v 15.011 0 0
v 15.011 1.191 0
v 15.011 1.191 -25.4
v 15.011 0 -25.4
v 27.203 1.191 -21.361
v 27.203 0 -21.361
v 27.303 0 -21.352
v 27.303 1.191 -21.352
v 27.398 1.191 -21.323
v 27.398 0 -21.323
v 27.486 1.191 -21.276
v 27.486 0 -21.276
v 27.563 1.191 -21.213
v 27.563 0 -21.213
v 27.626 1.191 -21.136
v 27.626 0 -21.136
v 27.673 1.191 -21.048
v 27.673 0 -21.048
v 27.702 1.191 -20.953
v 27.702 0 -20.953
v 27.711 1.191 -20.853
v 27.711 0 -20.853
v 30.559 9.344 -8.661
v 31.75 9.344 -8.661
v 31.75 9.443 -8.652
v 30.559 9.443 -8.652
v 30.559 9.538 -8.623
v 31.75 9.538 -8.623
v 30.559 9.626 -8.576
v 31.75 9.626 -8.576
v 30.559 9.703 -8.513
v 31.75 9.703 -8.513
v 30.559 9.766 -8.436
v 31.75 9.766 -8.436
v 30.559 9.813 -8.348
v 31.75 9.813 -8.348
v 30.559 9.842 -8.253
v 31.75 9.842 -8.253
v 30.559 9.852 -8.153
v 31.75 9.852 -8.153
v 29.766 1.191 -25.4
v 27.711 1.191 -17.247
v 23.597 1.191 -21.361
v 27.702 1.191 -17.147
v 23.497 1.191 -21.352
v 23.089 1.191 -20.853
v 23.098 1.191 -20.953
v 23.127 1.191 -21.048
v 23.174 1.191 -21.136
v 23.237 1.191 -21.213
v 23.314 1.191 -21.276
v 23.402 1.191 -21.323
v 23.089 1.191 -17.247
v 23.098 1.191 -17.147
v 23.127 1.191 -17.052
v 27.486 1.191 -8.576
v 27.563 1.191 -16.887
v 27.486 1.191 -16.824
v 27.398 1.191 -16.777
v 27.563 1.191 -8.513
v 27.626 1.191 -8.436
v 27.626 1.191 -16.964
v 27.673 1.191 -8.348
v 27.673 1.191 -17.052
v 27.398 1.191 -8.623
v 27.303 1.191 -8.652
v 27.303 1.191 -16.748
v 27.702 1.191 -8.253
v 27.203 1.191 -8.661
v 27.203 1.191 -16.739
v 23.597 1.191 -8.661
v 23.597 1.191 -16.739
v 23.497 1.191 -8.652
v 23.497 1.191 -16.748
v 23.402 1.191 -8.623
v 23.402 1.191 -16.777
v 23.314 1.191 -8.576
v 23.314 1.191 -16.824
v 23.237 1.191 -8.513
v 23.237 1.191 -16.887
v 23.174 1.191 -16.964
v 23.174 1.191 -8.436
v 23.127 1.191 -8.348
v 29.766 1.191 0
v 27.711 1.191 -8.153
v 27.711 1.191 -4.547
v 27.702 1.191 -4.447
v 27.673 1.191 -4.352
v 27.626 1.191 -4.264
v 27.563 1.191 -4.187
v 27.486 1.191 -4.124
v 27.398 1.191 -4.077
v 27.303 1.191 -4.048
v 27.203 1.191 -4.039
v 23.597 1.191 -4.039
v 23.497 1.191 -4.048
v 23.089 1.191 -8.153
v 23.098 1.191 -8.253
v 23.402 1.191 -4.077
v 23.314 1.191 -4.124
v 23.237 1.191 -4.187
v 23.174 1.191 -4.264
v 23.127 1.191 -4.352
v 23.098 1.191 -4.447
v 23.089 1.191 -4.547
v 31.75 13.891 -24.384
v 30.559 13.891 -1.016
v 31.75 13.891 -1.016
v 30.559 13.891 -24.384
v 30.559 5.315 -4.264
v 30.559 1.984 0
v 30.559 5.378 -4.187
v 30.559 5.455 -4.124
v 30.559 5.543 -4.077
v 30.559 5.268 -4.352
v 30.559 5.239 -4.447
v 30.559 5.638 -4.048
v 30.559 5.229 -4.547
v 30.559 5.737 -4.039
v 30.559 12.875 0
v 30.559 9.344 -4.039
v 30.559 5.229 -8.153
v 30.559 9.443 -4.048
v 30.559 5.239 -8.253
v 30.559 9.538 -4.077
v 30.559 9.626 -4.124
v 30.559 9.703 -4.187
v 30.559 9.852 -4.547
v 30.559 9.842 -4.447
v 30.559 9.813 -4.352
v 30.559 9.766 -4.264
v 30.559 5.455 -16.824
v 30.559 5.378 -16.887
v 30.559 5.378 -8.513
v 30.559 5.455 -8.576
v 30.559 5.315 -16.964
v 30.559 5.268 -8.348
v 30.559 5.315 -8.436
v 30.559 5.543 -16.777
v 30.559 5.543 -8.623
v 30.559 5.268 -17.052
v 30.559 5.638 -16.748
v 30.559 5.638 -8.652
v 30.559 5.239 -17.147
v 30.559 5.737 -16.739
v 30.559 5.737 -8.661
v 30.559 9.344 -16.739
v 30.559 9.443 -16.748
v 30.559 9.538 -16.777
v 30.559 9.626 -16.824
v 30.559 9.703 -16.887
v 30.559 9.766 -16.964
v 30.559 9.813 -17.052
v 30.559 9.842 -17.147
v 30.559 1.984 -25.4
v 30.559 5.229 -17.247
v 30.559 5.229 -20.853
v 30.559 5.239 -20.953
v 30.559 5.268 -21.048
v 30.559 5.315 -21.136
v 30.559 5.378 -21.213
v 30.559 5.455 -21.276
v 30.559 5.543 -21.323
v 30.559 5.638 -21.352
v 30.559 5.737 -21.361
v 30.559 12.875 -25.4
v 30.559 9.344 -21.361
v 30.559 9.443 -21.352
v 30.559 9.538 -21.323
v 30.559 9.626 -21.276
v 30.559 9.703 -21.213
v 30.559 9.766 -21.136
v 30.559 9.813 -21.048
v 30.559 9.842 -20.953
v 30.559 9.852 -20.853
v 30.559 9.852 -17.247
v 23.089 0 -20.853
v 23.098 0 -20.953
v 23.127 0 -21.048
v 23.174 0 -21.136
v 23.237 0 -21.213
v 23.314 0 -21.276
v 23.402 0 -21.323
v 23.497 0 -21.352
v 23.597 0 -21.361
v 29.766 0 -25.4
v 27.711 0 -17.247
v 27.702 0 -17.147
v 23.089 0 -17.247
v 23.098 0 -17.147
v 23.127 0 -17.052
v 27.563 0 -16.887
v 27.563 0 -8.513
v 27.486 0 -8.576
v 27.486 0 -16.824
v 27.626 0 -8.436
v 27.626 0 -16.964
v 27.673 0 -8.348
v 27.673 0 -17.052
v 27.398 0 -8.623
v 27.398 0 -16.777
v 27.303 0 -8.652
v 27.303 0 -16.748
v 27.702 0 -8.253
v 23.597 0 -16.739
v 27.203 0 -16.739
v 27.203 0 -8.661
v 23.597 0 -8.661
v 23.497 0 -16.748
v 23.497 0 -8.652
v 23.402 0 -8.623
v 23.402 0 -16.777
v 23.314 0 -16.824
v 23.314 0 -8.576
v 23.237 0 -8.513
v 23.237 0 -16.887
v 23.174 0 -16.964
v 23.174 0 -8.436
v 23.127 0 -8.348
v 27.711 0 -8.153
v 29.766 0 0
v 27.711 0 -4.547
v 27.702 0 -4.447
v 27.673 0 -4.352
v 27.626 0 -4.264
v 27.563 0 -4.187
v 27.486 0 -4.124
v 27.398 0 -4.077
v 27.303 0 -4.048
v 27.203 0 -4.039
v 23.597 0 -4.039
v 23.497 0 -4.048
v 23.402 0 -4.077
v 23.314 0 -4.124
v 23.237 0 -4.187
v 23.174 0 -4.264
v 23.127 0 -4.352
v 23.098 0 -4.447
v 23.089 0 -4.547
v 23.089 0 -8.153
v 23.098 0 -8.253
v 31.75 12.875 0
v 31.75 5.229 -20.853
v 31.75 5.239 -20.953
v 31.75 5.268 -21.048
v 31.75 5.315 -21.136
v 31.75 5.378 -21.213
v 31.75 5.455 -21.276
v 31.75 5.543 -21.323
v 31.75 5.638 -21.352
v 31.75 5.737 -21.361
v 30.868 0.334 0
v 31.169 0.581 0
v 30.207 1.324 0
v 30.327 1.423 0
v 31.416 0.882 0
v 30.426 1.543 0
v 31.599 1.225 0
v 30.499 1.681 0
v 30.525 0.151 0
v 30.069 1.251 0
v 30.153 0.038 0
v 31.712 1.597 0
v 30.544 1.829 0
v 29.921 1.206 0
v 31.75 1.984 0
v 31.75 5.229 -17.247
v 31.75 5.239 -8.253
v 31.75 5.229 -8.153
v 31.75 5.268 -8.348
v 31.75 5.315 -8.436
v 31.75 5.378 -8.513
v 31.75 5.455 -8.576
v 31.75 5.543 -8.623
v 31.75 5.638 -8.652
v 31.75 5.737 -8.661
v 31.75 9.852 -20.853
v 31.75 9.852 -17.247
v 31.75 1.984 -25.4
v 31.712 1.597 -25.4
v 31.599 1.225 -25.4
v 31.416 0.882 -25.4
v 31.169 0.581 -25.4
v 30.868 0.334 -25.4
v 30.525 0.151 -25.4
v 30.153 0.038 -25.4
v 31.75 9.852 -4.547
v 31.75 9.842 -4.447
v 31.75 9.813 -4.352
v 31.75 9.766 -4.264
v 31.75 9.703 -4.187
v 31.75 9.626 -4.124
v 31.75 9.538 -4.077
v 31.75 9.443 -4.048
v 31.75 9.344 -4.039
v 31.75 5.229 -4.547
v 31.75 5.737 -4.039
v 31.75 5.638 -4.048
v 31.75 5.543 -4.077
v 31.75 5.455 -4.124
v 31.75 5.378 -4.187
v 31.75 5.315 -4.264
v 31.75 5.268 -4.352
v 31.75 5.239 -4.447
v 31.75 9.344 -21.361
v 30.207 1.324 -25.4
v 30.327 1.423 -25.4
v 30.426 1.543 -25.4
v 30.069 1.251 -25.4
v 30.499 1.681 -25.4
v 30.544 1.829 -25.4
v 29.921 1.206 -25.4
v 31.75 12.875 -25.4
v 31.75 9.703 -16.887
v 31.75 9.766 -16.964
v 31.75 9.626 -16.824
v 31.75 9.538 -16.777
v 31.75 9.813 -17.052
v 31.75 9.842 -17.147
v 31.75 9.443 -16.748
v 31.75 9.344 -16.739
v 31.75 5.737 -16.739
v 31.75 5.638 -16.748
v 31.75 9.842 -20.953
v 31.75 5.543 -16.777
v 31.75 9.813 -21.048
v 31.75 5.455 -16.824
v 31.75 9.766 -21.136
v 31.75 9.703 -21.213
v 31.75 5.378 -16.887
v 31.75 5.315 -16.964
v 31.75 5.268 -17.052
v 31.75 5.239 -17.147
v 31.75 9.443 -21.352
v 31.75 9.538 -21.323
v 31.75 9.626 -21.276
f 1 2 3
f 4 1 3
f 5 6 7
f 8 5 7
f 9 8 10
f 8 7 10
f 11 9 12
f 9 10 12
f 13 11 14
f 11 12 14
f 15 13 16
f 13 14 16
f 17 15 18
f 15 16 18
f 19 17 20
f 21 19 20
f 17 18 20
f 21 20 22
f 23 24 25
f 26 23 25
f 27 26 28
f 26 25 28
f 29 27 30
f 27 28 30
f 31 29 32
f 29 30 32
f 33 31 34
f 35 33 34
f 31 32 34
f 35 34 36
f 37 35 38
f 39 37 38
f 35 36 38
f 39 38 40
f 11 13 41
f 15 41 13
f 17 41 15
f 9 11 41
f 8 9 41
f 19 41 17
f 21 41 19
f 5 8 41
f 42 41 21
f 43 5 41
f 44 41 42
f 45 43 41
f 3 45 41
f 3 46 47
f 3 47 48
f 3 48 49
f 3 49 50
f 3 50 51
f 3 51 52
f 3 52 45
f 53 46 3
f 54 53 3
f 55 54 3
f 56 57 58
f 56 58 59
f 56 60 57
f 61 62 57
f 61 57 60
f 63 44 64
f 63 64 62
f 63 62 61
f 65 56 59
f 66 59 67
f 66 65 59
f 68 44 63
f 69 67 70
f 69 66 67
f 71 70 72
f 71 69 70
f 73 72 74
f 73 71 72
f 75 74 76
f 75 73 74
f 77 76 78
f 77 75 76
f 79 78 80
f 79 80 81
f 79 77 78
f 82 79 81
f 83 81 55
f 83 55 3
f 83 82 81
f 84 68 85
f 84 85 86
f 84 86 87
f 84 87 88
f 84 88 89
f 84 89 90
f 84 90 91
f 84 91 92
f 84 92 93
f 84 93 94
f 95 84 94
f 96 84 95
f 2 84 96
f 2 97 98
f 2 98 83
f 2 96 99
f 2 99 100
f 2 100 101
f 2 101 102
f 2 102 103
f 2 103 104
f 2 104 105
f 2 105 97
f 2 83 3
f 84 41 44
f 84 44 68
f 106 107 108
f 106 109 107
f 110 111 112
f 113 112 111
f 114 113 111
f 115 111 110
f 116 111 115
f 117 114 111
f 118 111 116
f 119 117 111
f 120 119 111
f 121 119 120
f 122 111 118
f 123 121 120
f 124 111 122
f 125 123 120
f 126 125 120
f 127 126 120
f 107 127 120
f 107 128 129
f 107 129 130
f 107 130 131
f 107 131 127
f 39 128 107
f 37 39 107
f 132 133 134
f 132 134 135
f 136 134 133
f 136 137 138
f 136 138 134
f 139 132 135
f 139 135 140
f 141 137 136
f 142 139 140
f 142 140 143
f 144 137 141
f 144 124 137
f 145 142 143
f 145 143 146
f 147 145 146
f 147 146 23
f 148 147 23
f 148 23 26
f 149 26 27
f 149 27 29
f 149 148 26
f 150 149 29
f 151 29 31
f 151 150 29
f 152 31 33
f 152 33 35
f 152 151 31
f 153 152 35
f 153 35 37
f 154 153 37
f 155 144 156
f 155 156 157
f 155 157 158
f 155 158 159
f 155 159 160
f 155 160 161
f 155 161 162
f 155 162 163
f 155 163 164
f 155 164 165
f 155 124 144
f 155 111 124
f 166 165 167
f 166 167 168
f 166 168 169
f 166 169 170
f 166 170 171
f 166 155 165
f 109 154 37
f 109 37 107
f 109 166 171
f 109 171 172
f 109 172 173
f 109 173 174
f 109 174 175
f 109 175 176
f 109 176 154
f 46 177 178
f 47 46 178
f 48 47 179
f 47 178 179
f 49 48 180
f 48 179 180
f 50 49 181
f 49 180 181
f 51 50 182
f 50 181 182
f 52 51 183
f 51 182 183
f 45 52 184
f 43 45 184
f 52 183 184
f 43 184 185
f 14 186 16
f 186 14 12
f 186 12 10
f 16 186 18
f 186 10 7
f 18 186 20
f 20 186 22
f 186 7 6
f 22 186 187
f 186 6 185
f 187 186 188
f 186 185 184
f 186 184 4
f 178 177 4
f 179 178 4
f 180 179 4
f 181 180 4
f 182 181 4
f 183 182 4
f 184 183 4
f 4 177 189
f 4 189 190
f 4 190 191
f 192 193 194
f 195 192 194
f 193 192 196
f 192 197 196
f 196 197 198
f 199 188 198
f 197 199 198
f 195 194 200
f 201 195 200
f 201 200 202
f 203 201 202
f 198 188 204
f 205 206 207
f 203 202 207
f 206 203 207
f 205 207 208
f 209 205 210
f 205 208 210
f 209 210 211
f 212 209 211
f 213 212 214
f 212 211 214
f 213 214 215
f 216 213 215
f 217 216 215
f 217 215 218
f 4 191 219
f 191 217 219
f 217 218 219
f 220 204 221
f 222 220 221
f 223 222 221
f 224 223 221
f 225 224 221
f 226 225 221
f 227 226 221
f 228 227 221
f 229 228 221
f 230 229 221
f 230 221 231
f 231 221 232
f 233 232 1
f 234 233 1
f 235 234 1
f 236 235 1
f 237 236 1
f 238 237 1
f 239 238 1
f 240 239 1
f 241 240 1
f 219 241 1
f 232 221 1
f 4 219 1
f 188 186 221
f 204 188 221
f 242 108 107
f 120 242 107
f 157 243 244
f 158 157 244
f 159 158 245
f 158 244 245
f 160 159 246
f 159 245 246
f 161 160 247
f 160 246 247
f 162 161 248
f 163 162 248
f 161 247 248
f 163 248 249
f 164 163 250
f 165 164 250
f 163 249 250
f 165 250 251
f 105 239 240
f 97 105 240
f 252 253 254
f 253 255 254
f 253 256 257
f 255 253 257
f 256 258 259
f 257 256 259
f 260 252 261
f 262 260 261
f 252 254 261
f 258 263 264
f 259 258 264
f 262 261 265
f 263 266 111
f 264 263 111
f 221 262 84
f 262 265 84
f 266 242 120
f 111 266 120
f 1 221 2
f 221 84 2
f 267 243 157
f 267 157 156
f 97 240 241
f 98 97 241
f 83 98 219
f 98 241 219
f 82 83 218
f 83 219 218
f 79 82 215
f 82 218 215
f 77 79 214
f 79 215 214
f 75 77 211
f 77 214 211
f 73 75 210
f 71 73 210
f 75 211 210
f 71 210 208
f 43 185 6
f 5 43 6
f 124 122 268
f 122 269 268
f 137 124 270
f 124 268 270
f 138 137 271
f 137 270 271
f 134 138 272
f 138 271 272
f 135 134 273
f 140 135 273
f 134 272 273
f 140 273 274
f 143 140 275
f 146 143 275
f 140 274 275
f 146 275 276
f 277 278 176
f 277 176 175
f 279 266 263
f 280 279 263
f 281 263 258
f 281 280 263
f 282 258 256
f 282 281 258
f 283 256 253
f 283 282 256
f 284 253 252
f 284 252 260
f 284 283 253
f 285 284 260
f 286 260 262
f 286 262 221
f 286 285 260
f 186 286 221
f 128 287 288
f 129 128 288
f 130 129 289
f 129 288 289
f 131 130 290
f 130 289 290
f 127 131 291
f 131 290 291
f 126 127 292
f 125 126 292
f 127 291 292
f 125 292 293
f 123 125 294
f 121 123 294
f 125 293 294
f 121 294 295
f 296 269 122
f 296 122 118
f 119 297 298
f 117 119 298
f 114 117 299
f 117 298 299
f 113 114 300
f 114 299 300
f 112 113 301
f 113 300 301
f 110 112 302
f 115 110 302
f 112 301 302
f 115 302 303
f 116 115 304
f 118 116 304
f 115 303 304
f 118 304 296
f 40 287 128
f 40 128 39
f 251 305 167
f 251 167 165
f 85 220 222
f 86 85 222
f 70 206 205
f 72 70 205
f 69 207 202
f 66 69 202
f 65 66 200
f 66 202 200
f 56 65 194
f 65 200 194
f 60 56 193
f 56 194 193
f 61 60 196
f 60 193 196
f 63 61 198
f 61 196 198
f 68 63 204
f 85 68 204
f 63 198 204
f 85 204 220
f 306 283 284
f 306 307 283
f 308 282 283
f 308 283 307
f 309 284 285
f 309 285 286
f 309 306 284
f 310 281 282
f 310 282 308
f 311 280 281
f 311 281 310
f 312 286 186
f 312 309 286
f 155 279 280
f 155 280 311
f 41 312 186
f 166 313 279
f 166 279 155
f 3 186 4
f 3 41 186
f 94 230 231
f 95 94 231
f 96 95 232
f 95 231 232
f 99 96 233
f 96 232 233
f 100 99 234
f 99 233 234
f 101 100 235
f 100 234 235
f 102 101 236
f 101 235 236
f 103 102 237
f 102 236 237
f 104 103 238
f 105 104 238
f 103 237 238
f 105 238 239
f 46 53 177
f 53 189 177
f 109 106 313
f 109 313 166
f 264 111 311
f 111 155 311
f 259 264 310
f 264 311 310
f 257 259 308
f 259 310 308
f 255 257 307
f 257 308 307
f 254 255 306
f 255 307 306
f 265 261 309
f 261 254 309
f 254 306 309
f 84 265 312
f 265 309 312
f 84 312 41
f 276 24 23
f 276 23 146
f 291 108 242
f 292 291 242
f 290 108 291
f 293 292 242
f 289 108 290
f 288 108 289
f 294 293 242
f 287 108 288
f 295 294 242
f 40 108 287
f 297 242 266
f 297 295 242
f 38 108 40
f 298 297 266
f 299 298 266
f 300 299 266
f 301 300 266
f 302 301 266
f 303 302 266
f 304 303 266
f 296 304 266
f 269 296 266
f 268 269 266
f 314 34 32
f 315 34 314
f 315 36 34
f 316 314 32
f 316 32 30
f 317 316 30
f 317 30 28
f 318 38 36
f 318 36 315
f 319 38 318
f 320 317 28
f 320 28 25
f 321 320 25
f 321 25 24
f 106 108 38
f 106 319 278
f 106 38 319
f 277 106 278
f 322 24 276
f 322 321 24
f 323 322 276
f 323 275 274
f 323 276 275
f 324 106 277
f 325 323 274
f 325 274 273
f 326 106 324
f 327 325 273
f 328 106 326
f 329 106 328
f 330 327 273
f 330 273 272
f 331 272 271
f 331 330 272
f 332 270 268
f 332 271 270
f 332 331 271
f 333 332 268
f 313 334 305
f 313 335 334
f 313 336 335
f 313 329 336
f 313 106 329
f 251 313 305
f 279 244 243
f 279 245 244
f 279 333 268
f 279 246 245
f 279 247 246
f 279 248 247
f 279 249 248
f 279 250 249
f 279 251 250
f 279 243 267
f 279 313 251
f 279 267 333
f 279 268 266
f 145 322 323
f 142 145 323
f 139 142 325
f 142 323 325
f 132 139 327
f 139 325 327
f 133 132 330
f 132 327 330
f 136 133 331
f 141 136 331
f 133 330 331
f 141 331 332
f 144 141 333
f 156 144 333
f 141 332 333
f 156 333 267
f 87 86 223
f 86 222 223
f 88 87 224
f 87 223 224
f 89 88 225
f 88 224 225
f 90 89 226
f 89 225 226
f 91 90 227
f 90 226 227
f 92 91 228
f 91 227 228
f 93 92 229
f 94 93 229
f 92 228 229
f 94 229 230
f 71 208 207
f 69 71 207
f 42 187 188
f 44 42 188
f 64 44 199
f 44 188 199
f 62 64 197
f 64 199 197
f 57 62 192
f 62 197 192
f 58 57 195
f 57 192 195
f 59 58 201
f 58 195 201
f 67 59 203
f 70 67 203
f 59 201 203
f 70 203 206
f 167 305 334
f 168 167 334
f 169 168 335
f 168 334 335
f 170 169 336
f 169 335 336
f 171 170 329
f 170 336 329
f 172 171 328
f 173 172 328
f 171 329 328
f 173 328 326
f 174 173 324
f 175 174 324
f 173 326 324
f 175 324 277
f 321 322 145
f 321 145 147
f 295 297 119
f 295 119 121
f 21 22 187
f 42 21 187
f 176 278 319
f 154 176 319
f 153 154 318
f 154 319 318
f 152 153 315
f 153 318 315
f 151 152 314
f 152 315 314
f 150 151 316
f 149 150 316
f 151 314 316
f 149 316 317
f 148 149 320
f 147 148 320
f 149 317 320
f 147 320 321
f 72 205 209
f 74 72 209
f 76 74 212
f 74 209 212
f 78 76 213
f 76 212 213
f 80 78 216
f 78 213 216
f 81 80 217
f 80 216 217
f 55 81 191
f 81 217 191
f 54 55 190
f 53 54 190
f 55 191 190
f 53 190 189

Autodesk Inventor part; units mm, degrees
ref_plane "YZ Plane" through (0, 0, 0) normal (1, 0, 0) x (0, 1, 0)
ref_plane "XZ Plane" through (0, 0, 0) normal (0, 1, 0) x (-1, 0, 0)
sketch "Sketch1" plane through (0, 0, 0) normal (0, 1, 0) x (-1, 0, 0)
  line L0 (-31.75, 0) -> (31.75, 0)
  line L1 (31.75, 0) -> (31.75, -25.4)
  line L2 (31.75, -25.4) -> (-31.75, -25.4)
  line L3 (-31.75, -25.4) -> (-31.75, 0)
  line L4 (31.75, 0) -> (-31.75, -25.4) construction
  point P0 (0, 0)
  point P1 (0, 0)
  dimension "d0" = 63.5
  dimension "d1" = 25.4
extrude "Plate1" add sketch "Sketch1" along normal blind 1.1906
sketch "Sketch2" plane through (30.5594, 0, -25.4) normal (1, 0, 0) x (0, 1, 0)
  line L0 (0, 25.4) -> (0, 0)
  line L1 (0, 0) -> (13.8906, 0)
  line L2 (13.8906, 0) -> (13.8906, 25.4)
  line L3 (13.8906, 25.4) -> (0, 25.4)
edge flange "Flanges" height 12.7 angle 90 thickness 1.1906 bend radius 0.7937 thickness toward (1, 0, 0) relief tear relief width 1.1906 relief depth 0.5953 corner gap 1.1906 corner form 0 edges at (31.75, 1.1906, -12.7) (-31.75, 1.1906, -12.7) wall of the first edge with corners at (30.5594, 0, 0) (30.5594, 0, -25.4) (30.5594, 13.8906, -25.4) (30.5594, 13.8906, 0)
bend "Bend1"
corner "Corner1"
sketch "Sketch3" plane through (31.75, 1.9844, -25.4) normal (1, 0, 0) x (0, 0, -1)
  line L0 (-20.8534, 7.8676) -> (-17.2466, 7.8676)
  line L1 (-16.7386, 7.3596) -> (-16.7386, 3.7528)
  line L2 (-17.2466, 3.2448) -> (-20.8534, 3.2448)
  line L3 (-21.3614, 3.7528) -> (-21.3614, 7.3596)
  arc A0 (-20.8534, 7.8676) -> (-21.3614, 7.3596) centre (-20.8534, 7.3596) ccw
  arc A1 (-16.7386, 7.3596) -> (-17.2466, 7.8676) centre (-17.2466, 7.3596) ccw
  arc A2 (-17.2466, 3.2448) -> (-16.7386, 3.7528) centre (-17.2466, 3.7528) ccw
  arc A3 (-21.3614, 3.7528) -> (-20.8534, 3.2448) centre (-20.8534, 3.7528) ccw
  line L4 (-25.4, 0) -> (-25.4, 11.9062) construction
  line L5 (-25.4, 11.9062) -> (0, 11.9063) construction
  line L6 (-20.8534, 7.3596) -> (-17.2466, 3.7528) construction
  point P0 (-25.4, -1.9844)
  point P1 (-16.7386, 3.2448)
  point P2 (-21.3614, 3.2448)
  point P3 (-19.05, 5.5562)
  dimension "d16" = 4.6228
  dimension "d17" = 0.508
  dimension "d20" = 6.35
  dimension "d21" = 6.35
extrude "Flange Stamp" cut sketch "Sketch3" against normal blind 1.1906
sketch "Sketch7" plane through (31.75, 1.9844, 0) normal (1, 0, 0) x (0, 0, -1)
  arc A0 (4.5466, 7.8676) -> (4.0386, 7.3596) centre (4.5466, 7.3596) ccw construction
  arc A1 (8.1534, 3.2448) -> (8.6614, 3.7528) centre (8.1534, 3.7528) ccw construction
  circle A2 centre (6.35, 5.5563) radius 2.1844
  line L0 (4.5466, 7.3596) -> (8.1534, 3.7528) construction
  point P0 (0, -1.9844)
  dimension "d46" = 4.3688
surface extrude "Flange Circle" sketch "Sketch7" against normal up to surface (1.1906 mm away) shown yes curves A2
ref_plane "Flange Pattern Plane" through (31.75, 7.5406, -4.5466) normal (0, 1, 0) x (1, 0, 0)
sketch "Flange Pattern Sketch" plane through (31.75, 7.5406, -4.5466) normal (0, 1, 0) x (1, 0, 0)
  line L0 (0, 3.6068) -> (0, 0) construction
  line L1 (-76.2822, -4.5466) -> (13.1932, -4.5466) construction
  line L2 (0, 0) -> (-1.1906, 0) construction
  point P0 (-31.75, -4.5466)
  point P1 (0, 1.8034)
  point P2 (0, 14.5034)
  dimension "d131" = 12.7
  dimension "d134" = 12.7
pattern_sketch "Flange Pattern" of "Flange Circle", "Flange Stamp" from (31.75, 7.5406, -6.35) copies at (31.75, 7.5406, -19.05)
sketch "Sketch8" plane through (0, 0, 0) normal (0, -1, 0) x (1, 0, 0)
  line L0 (29.7656, 0) -> (-29.7656, 0) construction
  line L1 (27.2034, -4.0386) -> (23.5966, -4.0386)
  line L2 (23.0886, -4.5466) -> (23.0886, -8.1534)
  line L3 (23.5966, -8.6614) -> (27.2034, -8.6614)
  line L4 (27.7114, -8.1534) -> (27.7114, -4.5466)
  arc A0 (27.7114, -4.5466) -> (27.2034, -4.0386) centre (27.2034, -4.5466) ccw
  arc A1 (27.2034, -8.6614) -> (27.7114, -8.1534) centre (27.2034, -8.1534) ccw
  arc A2 (23.0886, -8.1534) -> (23.5966, -8.6614) centre (23.5966, -8.1534) ccw
  arc A3 (23.5966, -4.0386) -> (23.0886, -4.5466) centre (23.5966, -4.5466) ccw
  line L5 (27.2034, -4.5466) -> (23.5966, -8.1534) construction
  line L6 (31.75, 0) -> (31.75, -25.4) construction
  point P0 (0, 0)
  point P1 (23.0886, -8.6614)
  point P2 (27.7114, -8.6614)
  point P3 (25.4, -6.35)
  dimension "d49" = 4.6228
  dimension "d50" = 0.508
  dimension "d51" = 6.35
  dimension "d52" = 6.35
extrude "Body Stamp" cut sketch "Sketch8" against normal blind 1.1906
sketch "Sketch9" plane through (0, 0, 0) normal (0, -1, 0) x (1, 0, 0)
  arc A0 (27.7114, -4.5466) -> (27.2034, -4.0386) centre (27.2034, -4.5466) ccw construction
  arc A1 (23.0886, -8.1534) -> (23.5966, -8.6614) centre (23.5966, -8.1534) ccw construction
  line L0 (27.2034, -4.5466) -> (23.5966, -8.1534) construction
  circle A2 centre (25.4, -6.35) radius 2.1844
  point P0 (0, 0)
  dimension "d55" = 4.3688
surface extrude "Body Circle" sketch "Sketch9" against normal up to surface (1.1906 mm away) shown yes curves A2
sketch "Body Pattern Sketch" plane through (0, 0, 0) normal (0, -1, 0) x (1, 0, 0)
  line L0 (29.7656, 0) -> (-29.7656, 0) construction
  line L1 (31.75, 0) -> (31.75, -25.4) construction
  circle A0 centre (25.4, -6.35) radius 2.1844 construction
  point P0 (0, 0)
  point P1 (25.4, -19.05)
  dimension "d62" = 12.7
  dimension "d65" = 12.7
  dimension "d139" = 12.7
pattern_sketch "Body Pattern" of "Body Stamp", "Body Circle" from (25.4, 0, -6.35) copies at (25.4, 0, -19.05)
sketch "Arc Length" plane through (30.5594, 1.9844, 0) normal (0, 0, 1) x (1, 0, 0)
  line L0 (0, 0) -> (1.1906, 0) construction
  arc A0 (-0.7938, -0.7938) -> (0, 0) centre (-0.7938, 0) ccw construction
  line L1 (-0.7938, -1.9844) -> (-0.7938, -0.7938) construction
  arc A1 (-0.7938, -1.9844) -> (1.1906, 0) centre (-0.7938, 0) ccw construction
  point P0 (-30.5594, -1.9844)
  dimension "d85" = 3.117
  dimension "d92" = 1.2468
sketch "Sketch13" plane through (31.75, 13.8906, 0) normal (1, 0, 0) x (0, 0, -1)
  line L0 (0, 0) -> (25.4, 0) construction
  line L1 (62.4078, 0) -> (63.4238, -1.016)
  line L2 (63.4238, -1.016) -> (64.4398, 0)
  line L3 (62.4078, 0) -> (64.4398, 0)
  line L4 (25.4, -11.9063) -> (0, -11.9063) construction
  line L5 (63.4238, -10.8903) -> (61.3168, -12.9972)
  line L6 (61.3168, -12.9972) -> (63.4238, -15.1042)
  line L7 (63.4238, -15.1042) -> (65.5308, -12.9972)
  line L8 (65.5308, -12.9972) -> (63.4238, -10.8903)
  line L9 (63.4238, -10.8903) -> (63.4238, -15.1042) construction
  line L10 (63.4238, -1.016) -> (63.4238, -10.8903) construction
  line L11 (0, -11.9063) -> (25.4, -11.9063) construction
  point P0 (0, -13.8906)
  dimension "d86" = 4.2139
  dimension "d88" = 1.016
  dimension "d91" = 1.016
  dimension "d102" = 63.4238
feature "Notch" [suppressed]
mirror "Notch Mirror" [suppressed]
pattern_linear "Notch Pattern" [suppressed]
chamfer "End Chamfer" distance 1.016 angle 45 4 edges at (-31.1547, 13.8906, -25.4) (31.1547, 13.8906, -25.4) (-31.1547, 13.8906, 0) (31.1547, 13.8906, 0)
sketch "Sketch14" plane through (-31.75, 1.9844, 419.1) normal (1, 0, 0) x (0, 0, -1)
  line L0 (419.1, 11.9063) -> (444.5, 11.9063) construction
  line L1 (419.1, 0) -> (419.1, 11.9063) construction
  line L2 (419.1, -1.9844) -> (444.5, -1.9844) construction
  line L3 (419.1, 11.9063) -> (444.5, 11.9063)
  line L4 (444.5, 11.9063) -> (444.5, -1.9844)
  line L5 (444.5, -1.9844) -> (419.1, -1.9844)
  line L6 (419.1, -1.9844) -> (419.1, 11.9063)
  point P0 (382.0521, -1.9844)
extrude "Half Cut" cut sketch "Sketch14" along normal blind 46.7614
equation "\"d1\" = 12.7 * Length"
equation "\"d18\" = Thickness"
equation "\"d53\" = Thickness"
equation "\"d89\" = Thickness"
equation "\"d2\" = Thickness"
equation "\"d3\" = BendReliefWidth"
equation "\"d4\" = BendReliefDepth"
equation "\"d5\" = MinimumRemnant"
equation "\"d6\" = TransitionRadius"
equation "\"d10\" = CornerReliefSize"
equation "\"d11\" = GapSize"
equation "\"d12\" = JacobiRadiusSize"
equation "\"BendRadius\" = Thickness"
equation "\"BendReliefWidth\" = Thickness"
equation "\"BendReliefDepth\" = 0.5 * Thickness"
equation "\"CornerReliefSize\" = 4 * Thickness"
equation "\"MinimumRemnant\" = 2 * Thickness"
equation "\"TransitionRadius\" = BendRadius"
equation "\"JacobiRadiusSize\" = BendRadius"
equation "\"GapSize\" = Thickness"
equation "\"Length\" = 2"
equation "\"Thickness\" = 1.190625"
properties part number "Alu C 1x3x1x35"
